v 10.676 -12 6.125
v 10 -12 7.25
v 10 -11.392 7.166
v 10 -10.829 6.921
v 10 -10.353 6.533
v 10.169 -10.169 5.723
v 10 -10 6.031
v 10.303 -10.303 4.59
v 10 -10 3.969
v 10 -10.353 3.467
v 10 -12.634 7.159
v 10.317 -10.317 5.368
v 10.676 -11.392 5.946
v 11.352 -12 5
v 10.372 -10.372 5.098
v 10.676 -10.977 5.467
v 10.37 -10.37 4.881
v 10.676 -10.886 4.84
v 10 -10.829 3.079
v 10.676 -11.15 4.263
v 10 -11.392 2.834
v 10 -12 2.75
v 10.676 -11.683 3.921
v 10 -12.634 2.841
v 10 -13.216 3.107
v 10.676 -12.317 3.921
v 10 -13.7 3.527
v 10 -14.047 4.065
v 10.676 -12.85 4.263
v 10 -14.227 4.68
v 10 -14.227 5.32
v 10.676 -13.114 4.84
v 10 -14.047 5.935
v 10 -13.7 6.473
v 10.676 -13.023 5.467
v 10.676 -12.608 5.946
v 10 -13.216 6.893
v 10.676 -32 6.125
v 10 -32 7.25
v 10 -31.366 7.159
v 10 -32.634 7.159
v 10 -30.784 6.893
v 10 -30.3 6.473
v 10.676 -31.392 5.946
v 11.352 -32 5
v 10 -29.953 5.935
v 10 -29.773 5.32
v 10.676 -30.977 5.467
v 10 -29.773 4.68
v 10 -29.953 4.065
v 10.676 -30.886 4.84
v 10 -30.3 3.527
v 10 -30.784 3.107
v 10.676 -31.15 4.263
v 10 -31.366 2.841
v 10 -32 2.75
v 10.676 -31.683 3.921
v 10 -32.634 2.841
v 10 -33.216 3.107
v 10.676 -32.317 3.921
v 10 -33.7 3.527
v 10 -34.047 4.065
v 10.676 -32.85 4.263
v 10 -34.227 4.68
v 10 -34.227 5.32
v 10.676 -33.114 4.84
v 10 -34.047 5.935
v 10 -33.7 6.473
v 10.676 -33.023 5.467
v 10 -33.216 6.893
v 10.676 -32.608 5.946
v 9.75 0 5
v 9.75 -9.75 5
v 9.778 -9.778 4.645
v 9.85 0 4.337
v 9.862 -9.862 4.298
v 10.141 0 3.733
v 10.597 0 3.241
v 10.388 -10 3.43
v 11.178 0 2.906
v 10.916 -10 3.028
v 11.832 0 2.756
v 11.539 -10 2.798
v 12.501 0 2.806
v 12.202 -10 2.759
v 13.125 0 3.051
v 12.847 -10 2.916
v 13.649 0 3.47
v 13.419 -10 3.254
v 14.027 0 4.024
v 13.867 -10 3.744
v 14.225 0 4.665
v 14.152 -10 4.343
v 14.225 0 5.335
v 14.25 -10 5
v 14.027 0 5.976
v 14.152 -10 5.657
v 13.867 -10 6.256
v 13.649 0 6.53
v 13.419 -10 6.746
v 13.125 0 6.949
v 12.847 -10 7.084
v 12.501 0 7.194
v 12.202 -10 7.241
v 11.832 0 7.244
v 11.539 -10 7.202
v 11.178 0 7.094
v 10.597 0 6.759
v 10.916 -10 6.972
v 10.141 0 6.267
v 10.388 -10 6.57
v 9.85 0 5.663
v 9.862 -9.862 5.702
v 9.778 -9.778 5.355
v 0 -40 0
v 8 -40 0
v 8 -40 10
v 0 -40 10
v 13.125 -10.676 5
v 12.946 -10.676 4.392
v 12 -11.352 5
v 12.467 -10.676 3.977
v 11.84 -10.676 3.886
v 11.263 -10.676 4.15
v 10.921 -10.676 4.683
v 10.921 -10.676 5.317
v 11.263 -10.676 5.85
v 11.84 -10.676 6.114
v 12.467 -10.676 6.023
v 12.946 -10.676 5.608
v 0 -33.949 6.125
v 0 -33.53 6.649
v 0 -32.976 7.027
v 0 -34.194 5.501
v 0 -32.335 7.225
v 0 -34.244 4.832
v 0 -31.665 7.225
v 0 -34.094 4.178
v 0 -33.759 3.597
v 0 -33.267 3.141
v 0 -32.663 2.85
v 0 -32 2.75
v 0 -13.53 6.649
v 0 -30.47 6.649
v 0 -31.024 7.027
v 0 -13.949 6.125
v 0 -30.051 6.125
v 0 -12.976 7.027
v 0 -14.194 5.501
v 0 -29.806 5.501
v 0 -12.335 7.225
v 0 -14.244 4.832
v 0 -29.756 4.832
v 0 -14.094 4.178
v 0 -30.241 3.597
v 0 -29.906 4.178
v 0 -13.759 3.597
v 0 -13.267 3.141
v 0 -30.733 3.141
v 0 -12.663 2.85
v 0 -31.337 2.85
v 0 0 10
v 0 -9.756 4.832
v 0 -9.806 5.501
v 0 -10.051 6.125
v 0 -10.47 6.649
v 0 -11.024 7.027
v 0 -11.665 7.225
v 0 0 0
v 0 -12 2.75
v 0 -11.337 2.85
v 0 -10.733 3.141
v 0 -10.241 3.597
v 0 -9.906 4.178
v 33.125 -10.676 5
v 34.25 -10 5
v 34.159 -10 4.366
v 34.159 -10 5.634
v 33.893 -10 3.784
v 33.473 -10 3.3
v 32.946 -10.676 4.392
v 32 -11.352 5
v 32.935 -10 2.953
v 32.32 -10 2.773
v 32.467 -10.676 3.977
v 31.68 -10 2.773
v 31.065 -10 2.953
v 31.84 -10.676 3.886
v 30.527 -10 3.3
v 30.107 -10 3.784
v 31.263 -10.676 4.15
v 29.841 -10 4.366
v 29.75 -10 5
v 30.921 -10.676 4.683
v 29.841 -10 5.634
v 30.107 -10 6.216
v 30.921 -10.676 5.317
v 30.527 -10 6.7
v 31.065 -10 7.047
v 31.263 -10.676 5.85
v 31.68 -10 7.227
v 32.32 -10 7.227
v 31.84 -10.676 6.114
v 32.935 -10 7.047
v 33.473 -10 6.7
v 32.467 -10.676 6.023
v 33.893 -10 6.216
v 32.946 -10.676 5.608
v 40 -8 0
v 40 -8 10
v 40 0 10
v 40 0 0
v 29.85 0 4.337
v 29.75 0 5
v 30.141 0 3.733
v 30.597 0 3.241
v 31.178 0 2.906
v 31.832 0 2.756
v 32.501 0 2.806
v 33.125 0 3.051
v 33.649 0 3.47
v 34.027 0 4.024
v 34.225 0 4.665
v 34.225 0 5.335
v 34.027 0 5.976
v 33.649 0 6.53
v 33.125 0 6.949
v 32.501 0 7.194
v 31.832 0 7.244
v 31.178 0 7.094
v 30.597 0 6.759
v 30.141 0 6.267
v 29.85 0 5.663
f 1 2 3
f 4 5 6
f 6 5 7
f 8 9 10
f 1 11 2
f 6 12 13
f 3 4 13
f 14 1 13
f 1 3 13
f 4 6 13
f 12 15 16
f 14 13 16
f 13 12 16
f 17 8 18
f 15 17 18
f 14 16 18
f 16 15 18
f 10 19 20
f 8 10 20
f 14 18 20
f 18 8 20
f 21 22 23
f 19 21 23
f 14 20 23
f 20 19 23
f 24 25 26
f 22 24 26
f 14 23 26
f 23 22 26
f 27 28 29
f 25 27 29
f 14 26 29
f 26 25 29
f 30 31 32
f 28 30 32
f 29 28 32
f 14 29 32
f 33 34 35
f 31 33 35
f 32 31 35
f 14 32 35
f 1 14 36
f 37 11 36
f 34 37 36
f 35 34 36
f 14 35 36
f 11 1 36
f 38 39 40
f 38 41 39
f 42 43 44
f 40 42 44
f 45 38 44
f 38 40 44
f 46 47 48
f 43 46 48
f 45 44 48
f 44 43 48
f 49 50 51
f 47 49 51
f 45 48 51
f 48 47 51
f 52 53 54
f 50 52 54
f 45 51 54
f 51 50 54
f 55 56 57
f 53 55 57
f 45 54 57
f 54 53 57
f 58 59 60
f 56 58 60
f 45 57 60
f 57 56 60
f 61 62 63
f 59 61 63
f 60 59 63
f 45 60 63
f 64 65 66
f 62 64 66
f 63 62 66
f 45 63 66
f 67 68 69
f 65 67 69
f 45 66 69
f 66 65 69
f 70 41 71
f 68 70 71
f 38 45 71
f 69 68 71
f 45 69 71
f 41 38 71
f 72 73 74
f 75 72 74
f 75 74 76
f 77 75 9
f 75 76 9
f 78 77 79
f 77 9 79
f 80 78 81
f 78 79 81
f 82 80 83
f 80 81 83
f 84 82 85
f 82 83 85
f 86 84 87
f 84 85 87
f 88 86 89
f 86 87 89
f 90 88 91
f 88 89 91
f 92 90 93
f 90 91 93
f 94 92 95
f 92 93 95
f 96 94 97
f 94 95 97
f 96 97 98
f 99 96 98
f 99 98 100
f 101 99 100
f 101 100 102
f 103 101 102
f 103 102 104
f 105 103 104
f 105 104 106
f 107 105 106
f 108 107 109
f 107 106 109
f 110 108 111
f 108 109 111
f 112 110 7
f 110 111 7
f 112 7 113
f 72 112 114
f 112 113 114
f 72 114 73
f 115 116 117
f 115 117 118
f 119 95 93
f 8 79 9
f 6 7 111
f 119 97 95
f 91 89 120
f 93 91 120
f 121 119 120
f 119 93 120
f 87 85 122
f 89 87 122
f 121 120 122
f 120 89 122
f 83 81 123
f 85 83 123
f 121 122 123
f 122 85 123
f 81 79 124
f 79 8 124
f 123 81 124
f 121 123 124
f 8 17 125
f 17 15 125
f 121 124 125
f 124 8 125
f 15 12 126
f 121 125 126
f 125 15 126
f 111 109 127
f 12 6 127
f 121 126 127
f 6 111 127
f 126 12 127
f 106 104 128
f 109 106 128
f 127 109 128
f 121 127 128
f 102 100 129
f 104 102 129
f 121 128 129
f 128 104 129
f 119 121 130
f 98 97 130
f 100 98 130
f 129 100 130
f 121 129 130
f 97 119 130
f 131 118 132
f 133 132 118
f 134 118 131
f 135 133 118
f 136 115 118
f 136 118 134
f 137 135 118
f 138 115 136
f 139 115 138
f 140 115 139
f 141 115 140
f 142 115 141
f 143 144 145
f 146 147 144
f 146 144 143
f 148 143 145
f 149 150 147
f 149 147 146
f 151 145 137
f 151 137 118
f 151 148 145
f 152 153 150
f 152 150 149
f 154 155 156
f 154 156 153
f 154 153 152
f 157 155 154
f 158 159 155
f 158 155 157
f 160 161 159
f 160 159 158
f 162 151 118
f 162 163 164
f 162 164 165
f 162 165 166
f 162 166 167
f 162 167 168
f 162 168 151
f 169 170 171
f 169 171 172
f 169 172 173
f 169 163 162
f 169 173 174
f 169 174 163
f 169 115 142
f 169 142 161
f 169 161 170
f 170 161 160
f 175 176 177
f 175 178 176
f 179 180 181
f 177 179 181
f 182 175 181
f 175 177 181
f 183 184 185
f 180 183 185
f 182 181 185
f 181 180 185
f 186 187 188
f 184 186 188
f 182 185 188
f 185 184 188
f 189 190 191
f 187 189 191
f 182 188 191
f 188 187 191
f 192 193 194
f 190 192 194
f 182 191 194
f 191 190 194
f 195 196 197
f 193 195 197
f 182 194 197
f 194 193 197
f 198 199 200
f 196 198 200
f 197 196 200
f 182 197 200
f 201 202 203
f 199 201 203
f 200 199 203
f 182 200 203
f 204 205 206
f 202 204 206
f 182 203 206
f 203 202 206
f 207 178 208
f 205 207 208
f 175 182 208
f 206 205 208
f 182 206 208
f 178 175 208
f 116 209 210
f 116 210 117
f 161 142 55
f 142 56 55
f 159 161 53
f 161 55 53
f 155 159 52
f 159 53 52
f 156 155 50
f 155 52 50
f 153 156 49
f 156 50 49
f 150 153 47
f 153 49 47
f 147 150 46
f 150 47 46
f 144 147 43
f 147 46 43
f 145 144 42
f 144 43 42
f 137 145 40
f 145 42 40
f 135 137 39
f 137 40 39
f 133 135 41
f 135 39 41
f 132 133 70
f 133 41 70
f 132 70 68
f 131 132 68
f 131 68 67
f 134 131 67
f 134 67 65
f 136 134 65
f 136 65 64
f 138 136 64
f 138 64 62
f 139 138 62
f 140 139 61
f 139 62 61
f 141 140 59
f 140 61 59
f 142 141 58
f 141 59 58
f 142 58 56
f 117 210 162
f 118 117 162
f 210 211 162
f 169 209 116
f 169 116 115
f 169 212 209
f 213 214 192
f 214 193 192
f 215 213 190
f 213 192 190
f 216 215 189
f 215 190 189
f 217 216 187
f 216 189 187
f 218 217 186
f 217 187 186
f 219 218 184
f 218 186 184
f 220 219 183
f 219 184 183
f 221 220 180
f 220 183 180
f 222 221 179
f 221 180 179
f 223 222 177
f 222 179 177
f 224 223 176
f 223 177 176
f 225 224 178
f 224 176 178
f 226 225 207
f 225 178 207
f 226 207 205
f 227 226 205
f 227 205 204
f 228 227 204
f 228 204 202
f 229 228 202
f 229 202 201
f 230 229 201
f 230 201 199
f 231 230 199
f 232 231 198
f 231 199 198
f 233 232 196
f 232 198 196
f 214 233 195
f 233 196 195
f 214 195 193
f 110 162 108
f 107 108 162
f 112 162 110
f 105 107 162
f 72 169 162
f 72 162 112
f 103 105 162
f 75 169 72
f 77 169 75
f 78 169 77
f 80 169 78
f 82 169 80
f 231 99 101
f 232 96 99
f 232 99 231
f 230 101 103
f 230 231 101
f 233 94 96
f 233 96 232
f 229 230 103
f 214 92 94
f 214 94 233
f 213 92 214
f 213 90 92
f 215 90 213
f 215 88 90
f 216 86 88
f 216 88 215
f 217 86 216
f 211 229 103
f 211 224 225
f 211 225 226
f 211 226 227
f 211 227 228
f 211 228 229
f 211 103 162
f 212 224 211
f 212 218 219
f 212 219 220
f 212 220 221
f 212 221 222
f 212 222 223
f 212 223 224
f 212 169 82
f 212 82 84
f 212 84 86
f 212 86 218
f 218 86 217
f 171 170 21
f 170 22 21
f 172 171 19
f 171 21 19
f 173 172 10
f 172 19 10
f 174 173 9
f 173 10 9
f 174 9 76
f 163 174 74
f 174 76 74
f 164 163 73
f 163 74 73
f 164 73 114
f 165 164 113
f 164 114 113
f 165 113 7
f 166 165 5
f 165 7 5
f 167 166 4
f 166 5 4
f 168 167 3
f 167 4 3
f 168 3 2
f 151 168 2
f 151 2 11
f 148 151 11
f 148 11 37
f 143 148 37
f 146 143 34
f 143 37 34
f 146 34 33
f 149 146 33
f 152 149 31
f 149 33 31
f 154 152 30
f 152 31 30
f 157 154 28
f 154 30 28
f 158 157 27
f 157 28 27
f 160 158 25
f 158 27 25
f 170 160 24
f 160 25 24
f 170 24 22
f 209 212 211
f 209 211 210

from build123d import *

# Parameters (mm, degrees)
SALIENTE_EXTRUIR1_DEPTH          = 10
TALADRO_DE_MARGEN_PARA_M41_D     = 4.5
TALADRO_DE_MARGEN_PARA_M41_DEPTH = 10
TALADRO_DE_MARGEN_PARA_M41_TIP   = 1.351936393
TALADRO_DE_MARGEN_PARA_M42_D     = 4.5
TALADRO_DE_MARGEN_PARA_M42_DEPTH = 10
TALADRO_DE_MARGEN_PARA_M42_TIP   = 1.351936393


with BuildPart() as part:
    # Croquis1 → Saliente-Extruir1 (new body)
    with BuildSketch(Plane.XY):
        Polygon((40, -8), (8, -40), (0, -40), (0, 0), (40, 0), align=None)
    extrude(amount=SALIENTE_EXTRUIR1_DEPTH)

    # Taladro de margen para M41
    with Locations(Plane(origin=(0, 0, 0), x_dir=(1, 0, 0), z_dir=(0, 1, 0))):
        with Locations((12, -5), (32, -5)):
            Hole(TALADRO_DE_MARGEN_PARA_M41_D / 2, depth=TALADRO_DE_MARGEN_PARA_M41_DEPTH)
            with Locations((0, 0, -(TALADRO_DE_MARGEN_PARA_M41_DEPTH + TALADRO_DE_MARGEN_PARA_M41_TIP / 2))):  # 118° drill point
                Cone(0, TALADRO_DE_MARGEN_PARA_M41_D / 2, TALADRO_DE_MARGEN_PARA_M41_TIP, mode=Mode.SUBTRACT)

    # Taladro de margen para M42
    with Locations(Plane.ZY):
        with Locations((5, -12), (5, -32)):
            Hole(TALADRO_DE_MARGEN_PARA_M42_D / 2, depth=TALADRO_DE_MARGEN_PARA_M42_DEPTH)
            with Locations((0, 0, -(TALADRO_DE_MARGEN_PARA_M42_DEPTH + TALADRO_DE_MARGEN_PARA_M42_TIP / 2))):  # 118° drill point
                Cone(0, TALADRO_DE_MARGEN_PARA_M42_D / 2, TALADRO_DE_MARGEN_PARA_M42_TIP, mode=Mode.SUBTRACT)


solid = part.part
